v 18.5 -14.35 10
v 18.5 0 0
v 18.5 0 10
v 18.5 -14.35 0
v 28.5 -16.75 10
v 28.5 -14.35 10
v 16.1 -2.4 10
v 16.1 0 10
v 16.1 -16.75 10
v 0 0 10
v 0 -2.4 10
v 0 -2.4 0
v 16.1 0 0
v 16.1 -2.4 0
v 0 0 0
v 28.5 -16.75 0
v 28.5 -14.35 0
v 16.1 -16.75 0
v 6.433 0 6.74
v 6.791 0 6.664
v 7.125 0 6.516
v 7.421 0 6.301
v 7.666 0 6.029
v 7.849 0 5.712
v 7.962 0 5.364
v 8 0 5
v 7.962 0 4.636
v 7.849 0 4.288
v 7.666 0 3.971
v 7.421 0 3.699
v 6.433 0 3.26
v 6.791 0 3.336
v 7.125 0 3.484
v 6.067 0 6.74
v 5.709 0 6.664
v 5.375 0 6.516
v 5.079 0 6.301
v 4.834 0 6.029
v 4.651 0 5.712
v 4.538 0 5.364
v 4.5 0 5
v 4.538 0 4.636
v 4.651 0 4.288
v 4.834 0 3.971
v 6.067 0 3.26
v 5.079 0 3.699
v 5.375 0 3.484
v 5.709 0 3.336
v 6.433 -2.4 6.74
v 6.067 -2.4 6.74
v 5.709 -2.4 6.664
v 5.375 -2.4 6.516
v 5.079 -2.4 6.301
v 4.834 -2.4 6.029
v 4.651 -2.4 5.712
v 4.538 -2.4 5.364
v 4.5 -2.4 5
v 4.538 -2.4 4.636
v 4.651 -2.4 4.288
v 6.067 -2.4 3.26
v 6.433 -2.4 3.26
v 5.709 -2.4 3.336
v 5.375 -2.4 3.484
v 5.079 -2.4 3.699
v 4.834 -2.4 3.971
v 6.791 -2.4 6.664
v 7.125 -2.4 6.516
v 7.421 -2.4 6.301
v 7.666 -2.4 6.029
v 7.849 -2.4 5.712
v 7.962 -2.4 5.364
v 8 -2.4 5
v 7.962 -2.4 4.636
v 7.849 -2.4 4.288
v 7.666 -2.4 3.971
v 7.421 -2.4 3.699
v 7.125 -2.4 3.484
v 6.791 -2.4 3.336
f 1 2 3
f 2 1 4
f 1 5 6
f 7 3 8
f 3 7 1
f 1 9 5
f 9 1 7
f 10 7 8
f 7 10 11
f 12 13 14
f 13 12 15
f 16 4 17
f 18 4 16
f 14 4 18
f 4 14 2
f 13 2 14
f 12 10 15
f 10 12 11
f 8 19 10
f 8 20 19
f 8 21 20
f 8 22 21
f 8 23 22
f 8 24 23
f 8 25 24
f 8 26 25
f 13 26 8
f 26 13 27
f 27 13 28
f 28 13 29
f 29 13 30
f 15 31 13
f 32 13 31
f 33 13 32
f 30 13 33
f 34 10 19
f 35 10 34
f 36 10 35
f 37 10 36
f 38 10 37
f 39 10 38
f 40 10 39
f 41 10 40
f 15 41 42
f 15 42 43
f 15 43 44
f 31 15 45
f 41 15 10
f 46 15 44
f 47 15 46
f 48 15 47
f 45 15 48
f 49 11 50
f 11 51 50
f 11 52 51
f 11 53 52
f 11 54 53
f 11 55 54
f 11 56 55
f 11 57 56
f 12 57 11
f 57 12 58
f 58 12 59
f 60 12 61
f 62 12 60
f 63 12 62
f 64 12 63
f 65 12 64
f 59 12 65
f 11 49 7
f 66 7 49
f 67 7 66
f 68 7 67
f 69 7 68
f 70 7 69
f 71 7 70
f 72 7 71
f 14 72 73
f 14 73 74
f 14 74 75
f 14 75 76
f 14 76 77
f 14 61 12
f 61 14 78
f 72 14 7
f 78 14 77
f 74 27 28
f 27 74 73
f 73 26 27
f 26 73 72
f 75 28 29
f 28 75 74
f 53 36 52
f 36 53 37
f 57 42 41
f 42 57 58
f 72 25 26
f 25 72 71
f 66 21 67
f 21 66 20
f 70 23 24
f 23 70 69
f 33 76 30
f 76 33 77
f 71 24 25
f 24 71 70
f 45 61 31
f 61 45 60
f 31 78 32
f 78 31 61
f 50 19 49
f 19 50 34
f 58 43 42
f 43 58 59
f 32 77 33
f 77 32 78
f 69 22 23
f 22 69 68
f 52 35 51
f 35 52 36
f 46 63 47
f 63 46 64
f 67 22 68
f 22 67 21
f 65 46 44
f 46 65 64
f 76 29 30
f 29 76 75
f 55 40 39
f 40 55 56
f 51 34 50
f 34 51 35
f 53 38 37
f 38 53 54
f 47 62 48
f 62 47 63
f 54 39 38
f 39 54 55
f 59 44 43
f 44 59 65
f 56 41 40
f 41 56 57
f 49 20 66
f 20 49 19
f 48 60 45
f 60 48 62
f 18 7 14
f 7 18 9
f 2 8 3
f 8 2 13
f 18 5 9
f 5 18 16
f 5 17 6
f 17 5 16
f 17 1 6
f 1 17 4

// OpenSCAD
eps = 0.1;
th0 = 2.4; // original thickness
dth = 0; // extra thickness for the model
th  = th0 + dth;
h = 10;

fi = 3.5; // fi of screw
x1 = 18.5;
y2 = 16.75;
x3 = 12.4;

// screw block
translate([0, -th, 0])
  difference()
  {
    cube([x1, th, h]);
    translate([x1 - 10.5 - fi/2, -eps, h/2])
      rotate([-90, 0, 0])
        cylinder(r=fi/2, h=th+2*eps, $fn=30);
  }

// connector
translate([x1-th, -y2, 0])
  cube([th, y2, h]);

// block
translate([-dth, 0, 0])
  translate([x1-th0, -y2-th+th0, 0])
    cube([x3+dth, th, h]);
